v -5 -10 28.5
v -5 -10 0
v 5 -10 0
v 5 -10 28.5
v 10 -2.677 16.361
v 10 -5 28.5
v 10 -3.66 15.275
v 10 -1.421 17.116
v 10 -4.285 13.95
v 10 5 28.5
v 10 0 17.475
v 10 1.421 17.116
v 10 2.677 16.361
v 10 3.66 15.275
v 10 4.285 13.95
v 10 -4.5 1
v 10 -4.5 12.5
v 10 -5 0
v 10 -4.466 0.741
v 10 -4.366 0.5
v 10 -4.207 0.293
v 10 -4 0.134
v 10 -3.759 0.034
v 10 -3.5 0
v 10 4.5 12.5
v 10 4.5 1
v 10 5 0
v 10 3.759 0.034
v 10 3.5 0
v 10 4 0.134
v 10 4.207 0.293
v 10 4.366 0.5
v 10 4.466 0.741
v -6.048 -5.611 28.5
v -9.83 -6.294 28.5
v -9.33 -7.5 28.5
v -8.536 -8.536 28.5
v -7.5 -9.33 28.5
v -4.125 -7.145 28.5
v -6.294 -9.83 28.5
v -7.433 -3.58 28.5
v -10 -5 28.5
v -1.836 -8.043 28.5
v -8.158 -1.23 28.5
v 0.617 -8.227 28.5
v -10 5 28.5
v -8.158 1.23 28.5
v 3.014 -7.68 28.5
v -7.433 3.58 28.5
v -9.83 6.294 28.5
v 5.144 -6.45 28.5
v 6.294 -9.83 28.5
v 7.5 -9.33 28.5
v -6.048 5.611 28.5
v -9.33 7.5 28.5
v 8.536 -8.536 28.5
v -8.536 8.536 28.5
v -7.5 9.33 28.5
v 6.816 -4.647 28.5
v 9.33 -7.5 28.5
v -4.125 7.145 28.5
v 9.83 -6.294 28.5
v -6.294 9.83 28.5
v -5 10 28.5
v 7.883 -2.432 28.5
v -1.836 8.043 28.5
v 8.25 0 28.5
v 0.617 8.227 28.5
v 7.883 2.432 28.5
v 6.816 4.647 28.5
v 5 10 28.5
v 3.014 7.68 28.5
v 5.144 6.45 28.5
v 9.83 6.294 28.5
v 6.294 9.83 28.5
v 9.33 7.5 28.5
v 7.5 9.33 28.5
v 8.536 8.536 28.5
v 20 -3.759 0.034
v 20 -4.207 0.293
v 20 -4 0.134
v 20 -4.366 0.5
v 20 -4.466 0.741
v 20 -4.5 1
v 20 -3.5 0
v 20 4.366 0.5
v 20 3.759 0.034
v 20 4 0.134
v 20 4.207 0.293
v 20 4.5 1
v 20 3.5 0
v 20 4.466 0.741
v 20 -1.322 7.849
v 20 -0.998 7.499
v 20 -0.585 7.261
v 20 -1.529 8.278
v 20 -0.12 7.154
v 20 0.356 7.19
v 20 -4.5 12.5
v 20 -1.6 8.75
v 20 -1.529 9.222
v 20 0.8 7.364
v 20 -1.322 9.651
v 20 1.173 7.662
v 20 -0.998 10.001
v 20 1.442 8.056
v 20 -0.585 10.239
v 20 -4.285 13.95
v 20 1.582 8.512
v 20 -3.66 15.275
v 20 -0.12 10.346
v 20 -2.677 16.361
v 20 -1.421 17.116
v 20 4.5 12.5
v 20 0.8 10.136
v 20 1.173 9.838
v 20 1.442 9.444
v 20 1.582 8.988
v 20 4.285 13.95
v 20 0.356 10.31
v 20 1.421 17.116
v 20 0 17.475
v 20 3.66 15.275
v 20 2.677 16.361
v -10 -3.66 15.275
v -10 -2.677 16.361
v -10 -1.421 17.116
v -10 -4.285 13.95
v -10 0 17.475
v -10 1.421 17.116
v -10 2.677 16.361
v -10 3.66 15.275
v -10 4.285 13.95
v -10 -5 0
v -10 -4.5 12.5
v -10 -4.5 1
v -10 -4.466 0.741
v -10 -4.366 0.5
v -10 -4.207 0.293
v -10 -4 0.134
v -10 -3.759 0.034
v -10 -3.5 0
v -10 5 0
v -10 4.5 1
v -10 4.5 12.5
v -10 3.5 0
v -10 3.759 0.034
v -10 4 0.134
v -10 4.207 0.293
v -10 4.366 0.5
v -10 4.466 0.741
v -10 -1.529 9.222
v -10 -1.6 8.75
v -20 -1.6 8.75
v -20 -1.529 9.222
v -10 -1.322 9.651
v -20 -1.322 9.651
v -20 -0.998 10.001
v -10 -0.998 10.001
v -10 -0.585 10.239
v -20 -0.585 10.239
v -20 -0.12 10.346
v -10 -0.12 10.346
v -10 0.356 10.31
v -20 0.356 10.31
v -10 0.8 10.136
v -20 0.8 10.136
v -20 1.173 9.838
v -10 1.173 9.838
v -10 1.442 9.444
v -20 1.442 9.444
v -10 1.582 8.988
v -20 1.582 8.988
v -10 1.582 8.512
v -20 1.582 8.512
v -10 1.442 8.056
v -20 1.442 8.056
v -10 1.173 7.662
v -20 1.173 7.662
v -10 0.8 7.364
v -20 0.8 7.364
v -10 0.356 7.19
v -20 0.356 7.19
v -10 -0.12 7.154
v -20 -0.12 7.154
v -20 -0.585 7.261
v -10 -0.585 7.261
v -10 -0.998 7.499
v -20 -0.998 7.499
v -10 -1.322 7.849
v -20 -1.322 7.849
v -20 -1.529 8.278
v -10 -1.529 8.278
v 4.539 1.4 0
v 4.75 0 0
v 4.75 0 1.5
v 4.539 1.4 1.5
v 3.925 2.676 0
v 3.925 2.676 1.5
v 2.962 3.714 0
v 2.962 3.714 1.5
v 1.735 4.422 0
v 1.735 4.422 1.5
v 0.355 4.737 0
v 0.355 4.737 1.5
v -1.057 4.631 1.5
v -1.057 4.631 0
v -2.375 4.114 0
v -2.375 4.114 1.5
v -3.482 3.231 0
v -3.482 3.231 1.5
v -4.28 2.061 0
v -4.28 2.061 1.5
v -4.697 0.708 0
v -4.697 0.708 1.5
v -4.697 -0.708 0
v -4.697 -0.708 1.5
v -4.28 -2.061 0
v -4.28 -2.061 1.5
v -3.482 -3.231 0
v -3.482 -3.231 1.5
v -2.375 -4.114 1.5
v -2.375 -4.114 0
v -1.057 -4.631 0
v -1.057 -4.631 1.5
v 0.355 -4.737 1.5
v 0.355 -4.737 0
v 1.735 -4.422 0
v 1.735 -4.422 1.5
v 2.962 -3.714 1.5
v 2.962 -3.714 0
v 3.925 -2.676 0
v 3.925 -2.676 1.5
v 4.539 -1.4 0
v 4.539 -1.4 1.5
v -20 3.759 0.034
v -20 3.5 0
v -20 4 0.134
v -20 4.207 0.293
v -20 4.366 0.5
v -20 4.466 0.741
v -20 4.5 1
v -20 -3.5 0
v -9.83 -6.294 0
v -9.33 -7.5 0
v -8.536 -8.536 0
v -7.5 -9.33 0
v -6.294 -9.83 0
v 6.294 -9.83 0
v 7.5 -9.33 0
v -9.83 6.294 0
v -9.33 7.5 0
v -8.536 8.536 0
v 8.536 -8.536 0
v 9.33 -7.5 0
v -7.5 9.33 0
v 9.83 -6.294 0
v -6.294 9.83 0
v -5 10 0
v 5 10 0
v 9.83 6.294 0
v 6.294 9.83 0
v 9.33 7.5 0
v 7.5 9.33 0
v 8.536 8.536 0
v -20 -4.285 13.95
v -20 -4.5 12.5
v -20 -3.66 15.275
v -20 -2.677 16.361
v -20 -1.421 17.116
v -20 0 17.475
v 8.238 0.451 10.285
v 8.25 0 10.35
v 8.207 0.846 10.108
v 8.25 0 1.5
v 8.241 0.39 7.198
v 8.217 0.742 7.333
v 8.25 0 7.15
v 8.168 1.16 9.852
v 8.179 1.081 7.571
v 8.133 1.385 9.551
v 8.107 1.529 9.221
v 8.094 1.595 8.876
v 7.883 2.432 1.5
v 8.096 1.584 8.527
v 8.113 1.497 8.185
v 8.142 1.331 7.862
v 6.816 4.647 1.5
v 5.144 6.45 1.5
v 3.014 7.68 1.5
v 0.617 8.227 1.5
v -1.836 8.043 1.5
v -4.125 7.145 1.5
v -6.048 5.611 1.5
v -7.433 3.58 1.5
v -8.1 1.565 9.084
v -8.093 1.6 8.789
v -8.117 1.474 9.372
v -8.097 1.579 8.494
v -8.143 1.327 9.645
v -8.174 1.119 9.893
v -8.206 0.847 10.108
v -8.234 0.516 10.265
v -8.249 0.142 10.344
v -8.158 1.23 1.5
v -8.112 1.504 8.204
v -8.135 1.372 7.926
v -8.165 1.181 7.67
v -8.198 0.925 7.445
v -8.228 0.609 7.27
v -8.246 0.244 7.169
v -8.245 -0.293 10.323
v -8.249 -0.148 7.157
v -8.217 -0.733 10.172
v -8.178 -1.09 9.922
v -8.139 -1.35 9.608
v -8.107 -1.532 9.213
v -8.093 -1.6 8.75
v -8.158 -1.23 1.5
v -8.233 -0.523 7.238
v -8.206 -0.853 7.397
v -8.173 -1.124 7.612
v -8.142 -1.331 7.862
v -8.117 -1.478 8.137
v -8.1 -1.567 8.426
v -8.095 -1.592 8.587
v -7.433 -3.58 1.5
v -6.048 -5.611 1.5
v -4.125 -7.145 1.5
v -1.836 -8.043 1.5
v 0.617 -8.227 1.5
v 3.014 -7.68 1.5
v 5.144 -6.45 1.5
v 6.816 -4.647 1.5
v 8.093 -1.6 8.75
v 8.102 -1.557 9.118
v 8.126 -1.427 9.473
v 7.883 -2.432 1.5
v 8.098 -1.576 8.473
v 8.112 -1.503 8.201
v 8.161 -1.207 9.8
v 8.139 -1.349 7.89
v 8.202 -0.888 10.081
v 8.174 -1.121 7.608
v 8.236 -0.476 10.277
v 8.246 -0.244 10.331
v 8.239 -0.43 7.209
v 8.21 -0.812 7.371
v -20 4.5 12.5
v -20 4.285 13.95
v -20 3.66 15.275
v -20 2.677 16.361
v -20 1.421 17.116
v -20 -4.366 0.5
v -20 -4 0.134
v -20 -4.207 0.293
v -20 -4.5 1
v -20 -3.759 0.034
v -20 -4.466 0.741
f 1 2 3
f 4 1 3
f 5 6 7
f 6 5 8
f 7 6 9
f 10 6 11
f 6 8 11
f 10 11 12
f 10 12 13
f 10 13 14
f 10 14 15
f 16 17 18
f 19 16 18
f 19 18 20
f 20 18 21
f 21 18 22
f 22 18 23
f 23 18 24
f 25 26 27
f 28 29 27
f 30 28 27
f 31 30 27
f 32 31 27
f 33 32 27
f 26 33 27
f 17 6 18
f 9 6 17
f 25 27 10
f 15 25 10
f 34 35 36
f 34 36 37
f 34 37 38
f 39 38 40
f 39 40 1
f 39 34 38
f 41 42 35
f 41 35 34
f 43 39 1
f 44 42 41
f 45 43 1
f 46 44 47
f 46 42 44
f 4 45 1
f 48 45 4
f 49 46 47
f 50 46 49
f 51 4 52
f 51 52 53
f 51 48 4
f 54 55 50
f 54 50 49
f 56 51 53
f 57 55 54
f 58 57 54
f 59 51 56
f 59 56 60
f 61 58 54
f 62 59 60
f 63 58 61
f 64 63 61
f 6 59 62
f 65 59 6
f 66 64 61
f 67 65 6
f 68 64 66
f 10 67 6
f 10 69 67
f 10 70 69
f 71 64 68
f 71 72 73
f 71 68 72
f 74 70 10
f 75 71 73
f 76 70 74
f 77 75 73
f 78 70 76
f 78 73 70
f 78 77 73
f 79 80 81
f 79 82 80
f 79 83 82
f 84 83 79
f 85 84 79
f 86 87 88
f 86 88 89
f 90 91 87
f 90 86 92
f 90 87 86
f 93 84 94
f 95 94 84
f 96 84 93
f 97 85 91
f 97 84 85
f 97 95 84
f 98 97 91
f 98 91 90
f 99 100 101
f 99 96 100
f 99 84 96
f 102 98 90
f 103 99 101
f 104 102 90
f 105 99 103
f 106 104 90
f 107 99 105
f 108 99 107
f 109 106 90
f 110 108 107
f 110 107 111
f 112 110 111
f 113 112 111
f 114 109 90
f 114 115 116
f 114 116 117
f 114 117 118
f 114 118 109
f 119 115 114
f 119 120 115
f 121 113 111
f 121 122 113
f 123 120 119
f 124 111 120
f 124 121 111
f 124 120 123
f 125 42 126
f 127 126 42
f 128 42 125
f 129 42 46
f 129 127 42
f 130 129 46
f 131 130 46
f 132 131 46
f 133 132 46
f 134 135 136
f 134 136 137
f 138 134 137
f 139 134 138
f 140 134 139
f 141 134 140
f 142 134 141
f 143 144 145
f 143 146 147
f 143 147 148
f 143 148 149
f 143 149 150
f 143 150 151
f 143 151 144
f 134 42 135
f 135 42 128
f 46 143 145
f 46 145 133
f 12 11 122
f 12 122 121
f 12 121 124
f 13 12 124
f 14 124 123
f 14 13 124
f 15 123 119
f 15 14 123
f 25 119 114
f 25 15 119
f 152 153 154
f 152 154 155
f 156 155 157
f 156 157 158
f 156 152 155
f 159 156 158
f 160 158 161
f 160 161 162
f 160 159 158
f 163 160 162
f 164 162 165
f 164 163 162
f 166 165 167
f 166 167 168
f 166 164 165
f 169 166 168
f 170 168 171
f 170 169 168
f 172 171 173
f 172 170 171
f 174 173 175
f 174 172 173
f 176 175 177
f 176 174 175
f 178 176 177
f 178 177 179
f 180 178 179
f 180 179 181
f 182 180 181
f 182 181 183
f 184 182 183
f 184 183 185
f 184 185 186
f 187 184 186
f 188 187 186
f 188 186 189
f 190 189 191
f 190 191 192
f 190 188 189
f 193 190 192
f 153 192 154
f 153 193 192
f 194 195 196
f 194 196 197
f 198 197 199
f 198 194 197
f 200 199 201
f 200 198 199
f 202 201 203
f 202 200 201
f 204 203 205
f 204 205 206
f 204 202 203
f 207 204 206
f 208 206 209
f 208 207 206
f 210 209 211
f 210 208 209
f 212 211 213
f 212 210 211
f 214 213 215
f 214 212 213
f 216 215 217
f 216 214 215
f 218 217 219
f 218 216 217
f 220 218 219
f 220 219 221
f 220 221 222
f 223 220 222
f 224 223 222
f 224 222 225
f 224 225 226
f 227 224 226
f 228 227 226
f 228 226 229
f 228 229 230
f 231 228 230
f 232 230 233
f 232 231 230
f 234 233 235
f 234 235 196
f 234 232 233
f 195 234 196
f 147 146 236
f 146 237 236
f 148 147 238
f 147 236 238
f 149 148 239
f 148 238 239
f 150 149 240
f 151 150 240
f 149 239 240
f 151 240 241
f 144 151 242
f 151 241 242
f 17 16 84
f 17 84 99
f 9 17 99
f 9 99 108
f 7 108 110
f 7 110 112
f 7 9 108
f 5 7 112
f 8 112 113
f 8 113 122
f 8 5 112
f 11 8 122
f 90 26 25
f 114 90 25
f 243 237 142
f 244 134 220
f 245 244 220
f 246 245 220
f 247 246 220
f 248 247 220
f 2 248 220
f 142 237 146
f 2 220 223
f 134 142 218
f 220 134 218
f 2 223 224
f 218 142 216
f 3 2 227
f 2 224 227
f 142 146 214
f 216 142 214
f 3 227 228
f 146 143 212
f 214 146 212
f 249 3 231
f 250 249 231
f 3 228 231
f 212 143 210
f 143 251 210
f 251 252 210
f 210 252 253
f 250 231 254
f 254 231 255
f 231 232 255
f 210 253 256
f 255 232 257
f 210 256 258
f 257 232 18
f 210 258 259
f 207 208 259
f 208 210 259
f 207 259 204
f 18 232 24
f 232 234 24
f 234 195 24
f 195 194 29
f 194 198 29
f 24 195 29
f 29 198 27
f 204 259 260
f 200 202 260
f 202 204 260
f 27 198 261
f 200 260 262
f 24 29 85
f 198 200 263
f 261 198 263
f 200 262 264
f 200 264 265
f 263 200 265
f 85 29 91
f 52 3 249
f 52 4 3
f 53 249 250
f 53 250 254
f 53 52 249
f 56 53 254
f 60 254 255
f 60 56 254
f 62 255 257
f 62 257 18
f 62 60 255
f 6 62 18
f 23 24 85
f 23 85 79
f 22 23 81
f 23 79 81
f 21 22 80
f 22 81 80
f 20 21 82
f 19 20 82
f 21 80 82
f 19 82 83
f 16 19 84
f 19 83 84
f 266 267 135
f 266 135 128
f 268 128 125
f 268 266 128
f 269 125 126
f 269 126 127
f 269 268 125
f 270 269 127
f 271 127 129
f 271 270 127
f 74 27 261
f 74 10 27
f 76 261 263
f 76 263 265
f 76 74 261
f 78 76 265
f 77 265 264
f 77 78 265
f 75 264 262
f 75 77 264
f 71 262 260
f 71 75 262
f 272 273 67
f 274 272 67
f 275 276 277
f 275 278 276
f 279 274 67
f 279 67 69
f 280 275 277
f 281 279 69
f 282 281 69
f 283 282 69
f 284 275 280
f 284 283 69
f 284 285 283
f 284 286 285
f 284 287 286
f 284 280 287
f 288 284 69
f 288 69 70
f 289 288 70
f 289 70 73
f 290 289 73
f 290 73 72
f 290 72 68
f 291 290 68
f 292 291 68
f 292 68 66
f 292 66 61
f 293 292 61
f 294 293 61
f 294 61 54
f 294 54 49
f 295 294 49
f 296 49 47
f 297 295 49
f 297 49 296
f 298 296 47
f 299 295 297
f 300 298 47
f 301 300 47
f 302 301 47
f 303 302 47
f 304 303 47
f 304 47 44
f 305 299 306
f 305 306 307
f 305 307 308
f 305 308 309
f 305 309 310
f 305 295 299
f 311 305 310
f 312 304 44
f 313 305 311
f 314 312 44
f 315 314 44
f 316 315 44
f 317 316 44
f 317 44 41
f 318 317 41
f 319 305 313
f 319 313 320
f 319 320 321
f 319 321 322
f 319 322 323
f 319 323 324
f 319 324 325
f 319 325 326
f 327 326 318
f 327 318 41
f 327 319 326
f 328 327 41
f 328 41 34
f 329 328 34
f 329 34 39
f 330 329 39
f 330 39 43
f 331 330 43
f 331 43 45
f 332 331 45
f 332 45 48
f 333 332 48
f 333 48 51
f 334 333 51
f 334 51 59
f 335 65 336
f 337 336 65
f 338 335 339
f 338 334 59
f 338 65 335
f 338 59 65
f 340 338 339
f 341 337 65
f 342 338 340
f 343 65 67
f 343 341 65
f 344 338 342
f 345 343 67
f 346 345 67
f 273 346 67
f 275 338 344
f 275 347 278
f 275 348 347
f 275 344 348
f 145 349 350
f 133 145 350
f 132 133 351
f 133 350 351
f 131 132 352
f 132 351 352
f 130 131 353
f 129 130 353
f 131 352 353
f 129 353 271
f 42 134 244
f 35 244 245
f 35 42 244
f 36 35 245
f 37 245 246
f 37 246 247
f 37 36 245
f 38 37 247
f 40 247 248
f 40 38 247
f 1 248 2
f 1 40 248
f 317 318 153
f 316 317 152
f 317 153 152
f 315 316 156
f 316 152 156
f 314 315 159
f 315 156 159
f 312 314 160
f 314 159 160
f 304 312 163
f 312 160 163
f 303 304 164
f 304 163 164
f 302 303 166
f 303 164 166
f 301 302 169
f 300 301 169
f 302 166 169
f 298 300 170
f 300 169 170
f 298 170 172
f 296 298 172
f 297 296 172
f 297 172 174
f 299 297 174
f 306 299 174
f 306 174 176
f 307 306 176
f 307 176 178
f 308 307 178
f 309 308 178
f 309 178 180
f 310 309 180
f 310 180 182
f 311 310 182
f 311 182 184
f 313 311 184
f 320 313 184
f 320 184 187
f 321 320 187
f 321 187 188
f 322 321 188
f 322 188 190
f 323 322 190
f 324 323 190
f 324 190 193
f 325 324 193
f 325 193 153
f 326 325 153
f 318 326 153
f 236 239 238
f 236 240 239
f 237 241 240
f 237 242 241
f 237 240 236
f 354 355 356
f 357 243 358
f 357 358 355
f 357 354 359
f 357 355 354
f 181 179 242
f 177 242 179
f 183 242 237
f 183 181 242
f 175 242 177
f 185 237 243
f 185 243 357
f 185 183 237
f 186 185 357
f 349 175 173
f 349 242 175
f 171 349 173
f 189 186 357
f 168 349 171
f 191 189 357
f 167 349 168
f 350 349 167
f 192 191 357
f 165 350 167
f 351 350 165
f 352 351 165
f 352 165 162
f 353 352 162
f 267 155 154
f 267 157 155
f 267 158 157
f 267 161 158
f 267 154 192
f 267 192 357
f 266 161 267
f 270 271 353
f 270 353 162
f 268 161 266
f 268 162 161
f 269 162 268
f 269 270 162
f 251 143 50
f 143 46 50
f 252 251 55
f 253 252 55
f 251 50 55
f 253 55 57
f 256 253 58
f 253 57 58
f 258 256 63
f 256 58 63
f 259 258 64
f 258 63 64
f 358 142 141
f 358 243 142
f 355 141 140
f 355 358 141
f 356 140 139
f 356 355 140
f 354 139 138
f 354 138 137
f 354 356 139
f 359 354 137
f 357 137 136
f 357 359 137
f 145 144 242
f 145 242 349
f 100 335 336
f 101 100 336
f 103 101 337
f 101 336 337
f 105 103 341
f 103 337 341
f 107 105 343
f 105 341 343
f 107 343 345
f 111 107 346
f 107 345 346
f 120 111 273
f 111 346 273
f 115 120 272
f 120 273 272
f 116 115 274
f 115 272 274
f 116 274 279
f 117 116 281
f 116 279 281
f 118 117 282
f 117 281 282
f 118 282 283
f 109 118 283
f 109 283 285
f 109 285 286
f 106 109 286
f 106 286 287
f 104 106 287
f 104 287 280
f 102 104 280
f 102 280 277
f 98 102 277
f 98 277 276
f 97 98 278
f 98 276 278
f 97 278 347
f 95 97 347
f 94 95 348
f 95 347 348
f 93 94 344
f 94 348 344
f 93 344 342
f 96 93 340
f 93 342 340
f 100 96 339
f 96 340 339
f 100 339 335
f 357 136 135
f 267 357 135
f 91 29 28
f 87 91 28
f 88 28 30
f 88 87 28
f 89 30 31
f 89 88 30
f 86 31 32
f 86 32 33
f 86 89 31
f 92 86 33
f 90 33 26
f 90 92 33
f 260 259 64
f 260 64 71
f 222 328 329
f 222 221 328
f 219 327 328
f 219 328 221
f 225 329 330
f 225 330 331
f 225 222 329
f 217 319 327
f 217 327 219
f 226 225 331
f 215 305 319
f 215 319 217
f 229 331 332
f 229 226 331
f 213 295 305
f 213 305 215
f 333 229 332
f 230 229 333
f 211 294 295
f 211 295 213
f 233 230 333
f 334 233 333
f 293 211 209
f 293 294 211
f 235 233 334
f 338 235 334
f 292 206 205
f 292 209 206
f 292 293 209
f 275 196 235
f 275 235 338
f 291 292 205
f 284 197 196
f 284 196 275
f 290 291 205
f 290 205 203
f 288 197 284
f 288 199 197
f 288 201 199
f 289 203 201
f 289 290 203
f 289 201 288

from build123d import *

# Parameters (mm, degrees)
F0_W         = 20
F0_H         = 20
F0_R         = 8.25
F1_DEPTH     = 28.5
F0_R_2       = 4.75
F2_DEPTH     = 1.5
F3_W         = 9
F3_H         = 17.5
F3_R         = 1.6
F4_DEPTH     = 10
F5_W         = 9
F5_H         = 17.5
F6_DEPTH     = 10
F7_DEPTH     = 30.001
F8_R         = 5
F9_T1_DEPTH  = 22.5
F10_T1_DEPTH = 22.5
F11_R        = 1


# Not quite as in the source:
# - a fillet or chamfer that OpenCascade refuses, or shapes differently, is made with other operations: its cross-section is extruded or revolved along the edge and cut away or added


with BuildPart() as f1:
    # F0 (on Top) → F1 (new body)
    with BuildSketch(Plane.XY):
        Rectangle(F0_W, F0_H)
        Circle(F0_R, mode=Mode.SUBTRACT)
    extrude(amount=F1_DEPTH)

    # F0 (on Top) → F2 (join)
    with BuildSketch(Plane.XY):
        Circle(F0_R)
        Circle(F0_R_2, mode=Mode.SUBTRACT)
    extrude(amount=F2_DEPTH)

    # F3 (on face) → F4 (join)
    with BuildSketch(Plane(origin=(-10, 0, 0), x_dir=(0, -1, 0), z_dir=(-1, 0, 0))):
        with Locations((0, 8.75)):
            Rectangle(F3_W, F3_H)
        with Locations((0, 8.75)):
            Circle(F3_R, mode=Mode.SUBTRACT)
    extrude(amount=F4_DEPTH)

    # F5 (on face) → F6 (join)
    with BuildSketch(Plane.YZ.offset(10)):
        with Locations((0, 8.75)):
            Rectangle(F5_W, F5_H)
    extrude(amount=F6_DEPTH)

    # F3 (on face) → F7 (cut, through all)
    with BuildSketch(Plane(origin=(-10, 0, 0), x_dir=(0, -1, 0), z_dir=(-1, 0, 0))):
        with Locations((0, 8.75)):
            Circle(F3_R)
    extrude(amount=-F7_DEPTH, mode=Mode.SUBTRACT)

    # F8
    f8_edges = [f1.edges().sort_by_distance(p)[0] for p in [
        (-10, -10, 14.25),
        (10, -10, 14.25),
        (10, 10, 14.25),
        (-10, 10, 14.25),
    ]]
    fillet(f8_edges, radius=F8_R)

    # F9: fillet of radius 5 on 2 edges, made by hand

    # F9_s2 → F9_t1 (cut)
    with BuildSketch(Plane.YZ.offset(10)):
        with BuildLine():
            ThreePointArc((-4.5, 12.5), (-3.0355339059, 16.0355339059), (0.5, 17.5))
            Line((0.5, 17.5), (-4.5, 17.5))
            Line((-4.5, 17.5), (-4.5, 12.5))
        make_face()
        with BuildLine():
            ThreePointArc((-0.5, 17.5), (3.0355339059, 16.0355339059), (4.5, 12.5))
            Line((4.5, 12.5), (4.5, 17.5))
            Line((4.5, 17.5), (-0.5, 17.5))
        make_face()
    extrude(amount=F9_T1_DEPTH, mode=Mode.SUBTRACT)

    # F10: fillet of radius 5 on 2 edges, made by hand

    # F10_s2 → F10_t1 (cut)
    with BuildSketch(Plane.YZ.offset(-32.5)):
        with BuildLine():
            ThreePointArc((-4.5, 12.5), (-3.0355339059, 16.0355339059), (0.5, 17.5))
            Line((0.5, 17.5), (-4.5, 17.5))
            Line((-4.5, 17.5), (-4.5, 12.5))
        make_face()
        with BuildLine():
            ThreePointArc((4.5, 12.5), (3.0355339059, 16.0355339059), (-0.5, 17.5))
            Line((-0.5, 17.5), (4.5, 17.5))
            Line((4.5, 17.5), (4.5, 12.5))
        make_face()
    extrude(amount=F10_T1_DEPTH, mode=Mode.SUBTRACT)

    # F11
    f11_edges = [f1.edges().sort_by_distance(p)[0] for p in [
        (15, -4.5, 0),
        (15, 4.5, 0),
        (-15, 4.5, 0),
        (-15, -4.5, 0),
    ]]
    fillet(f11_edges, radius=F11_R)


solid = f1.part
